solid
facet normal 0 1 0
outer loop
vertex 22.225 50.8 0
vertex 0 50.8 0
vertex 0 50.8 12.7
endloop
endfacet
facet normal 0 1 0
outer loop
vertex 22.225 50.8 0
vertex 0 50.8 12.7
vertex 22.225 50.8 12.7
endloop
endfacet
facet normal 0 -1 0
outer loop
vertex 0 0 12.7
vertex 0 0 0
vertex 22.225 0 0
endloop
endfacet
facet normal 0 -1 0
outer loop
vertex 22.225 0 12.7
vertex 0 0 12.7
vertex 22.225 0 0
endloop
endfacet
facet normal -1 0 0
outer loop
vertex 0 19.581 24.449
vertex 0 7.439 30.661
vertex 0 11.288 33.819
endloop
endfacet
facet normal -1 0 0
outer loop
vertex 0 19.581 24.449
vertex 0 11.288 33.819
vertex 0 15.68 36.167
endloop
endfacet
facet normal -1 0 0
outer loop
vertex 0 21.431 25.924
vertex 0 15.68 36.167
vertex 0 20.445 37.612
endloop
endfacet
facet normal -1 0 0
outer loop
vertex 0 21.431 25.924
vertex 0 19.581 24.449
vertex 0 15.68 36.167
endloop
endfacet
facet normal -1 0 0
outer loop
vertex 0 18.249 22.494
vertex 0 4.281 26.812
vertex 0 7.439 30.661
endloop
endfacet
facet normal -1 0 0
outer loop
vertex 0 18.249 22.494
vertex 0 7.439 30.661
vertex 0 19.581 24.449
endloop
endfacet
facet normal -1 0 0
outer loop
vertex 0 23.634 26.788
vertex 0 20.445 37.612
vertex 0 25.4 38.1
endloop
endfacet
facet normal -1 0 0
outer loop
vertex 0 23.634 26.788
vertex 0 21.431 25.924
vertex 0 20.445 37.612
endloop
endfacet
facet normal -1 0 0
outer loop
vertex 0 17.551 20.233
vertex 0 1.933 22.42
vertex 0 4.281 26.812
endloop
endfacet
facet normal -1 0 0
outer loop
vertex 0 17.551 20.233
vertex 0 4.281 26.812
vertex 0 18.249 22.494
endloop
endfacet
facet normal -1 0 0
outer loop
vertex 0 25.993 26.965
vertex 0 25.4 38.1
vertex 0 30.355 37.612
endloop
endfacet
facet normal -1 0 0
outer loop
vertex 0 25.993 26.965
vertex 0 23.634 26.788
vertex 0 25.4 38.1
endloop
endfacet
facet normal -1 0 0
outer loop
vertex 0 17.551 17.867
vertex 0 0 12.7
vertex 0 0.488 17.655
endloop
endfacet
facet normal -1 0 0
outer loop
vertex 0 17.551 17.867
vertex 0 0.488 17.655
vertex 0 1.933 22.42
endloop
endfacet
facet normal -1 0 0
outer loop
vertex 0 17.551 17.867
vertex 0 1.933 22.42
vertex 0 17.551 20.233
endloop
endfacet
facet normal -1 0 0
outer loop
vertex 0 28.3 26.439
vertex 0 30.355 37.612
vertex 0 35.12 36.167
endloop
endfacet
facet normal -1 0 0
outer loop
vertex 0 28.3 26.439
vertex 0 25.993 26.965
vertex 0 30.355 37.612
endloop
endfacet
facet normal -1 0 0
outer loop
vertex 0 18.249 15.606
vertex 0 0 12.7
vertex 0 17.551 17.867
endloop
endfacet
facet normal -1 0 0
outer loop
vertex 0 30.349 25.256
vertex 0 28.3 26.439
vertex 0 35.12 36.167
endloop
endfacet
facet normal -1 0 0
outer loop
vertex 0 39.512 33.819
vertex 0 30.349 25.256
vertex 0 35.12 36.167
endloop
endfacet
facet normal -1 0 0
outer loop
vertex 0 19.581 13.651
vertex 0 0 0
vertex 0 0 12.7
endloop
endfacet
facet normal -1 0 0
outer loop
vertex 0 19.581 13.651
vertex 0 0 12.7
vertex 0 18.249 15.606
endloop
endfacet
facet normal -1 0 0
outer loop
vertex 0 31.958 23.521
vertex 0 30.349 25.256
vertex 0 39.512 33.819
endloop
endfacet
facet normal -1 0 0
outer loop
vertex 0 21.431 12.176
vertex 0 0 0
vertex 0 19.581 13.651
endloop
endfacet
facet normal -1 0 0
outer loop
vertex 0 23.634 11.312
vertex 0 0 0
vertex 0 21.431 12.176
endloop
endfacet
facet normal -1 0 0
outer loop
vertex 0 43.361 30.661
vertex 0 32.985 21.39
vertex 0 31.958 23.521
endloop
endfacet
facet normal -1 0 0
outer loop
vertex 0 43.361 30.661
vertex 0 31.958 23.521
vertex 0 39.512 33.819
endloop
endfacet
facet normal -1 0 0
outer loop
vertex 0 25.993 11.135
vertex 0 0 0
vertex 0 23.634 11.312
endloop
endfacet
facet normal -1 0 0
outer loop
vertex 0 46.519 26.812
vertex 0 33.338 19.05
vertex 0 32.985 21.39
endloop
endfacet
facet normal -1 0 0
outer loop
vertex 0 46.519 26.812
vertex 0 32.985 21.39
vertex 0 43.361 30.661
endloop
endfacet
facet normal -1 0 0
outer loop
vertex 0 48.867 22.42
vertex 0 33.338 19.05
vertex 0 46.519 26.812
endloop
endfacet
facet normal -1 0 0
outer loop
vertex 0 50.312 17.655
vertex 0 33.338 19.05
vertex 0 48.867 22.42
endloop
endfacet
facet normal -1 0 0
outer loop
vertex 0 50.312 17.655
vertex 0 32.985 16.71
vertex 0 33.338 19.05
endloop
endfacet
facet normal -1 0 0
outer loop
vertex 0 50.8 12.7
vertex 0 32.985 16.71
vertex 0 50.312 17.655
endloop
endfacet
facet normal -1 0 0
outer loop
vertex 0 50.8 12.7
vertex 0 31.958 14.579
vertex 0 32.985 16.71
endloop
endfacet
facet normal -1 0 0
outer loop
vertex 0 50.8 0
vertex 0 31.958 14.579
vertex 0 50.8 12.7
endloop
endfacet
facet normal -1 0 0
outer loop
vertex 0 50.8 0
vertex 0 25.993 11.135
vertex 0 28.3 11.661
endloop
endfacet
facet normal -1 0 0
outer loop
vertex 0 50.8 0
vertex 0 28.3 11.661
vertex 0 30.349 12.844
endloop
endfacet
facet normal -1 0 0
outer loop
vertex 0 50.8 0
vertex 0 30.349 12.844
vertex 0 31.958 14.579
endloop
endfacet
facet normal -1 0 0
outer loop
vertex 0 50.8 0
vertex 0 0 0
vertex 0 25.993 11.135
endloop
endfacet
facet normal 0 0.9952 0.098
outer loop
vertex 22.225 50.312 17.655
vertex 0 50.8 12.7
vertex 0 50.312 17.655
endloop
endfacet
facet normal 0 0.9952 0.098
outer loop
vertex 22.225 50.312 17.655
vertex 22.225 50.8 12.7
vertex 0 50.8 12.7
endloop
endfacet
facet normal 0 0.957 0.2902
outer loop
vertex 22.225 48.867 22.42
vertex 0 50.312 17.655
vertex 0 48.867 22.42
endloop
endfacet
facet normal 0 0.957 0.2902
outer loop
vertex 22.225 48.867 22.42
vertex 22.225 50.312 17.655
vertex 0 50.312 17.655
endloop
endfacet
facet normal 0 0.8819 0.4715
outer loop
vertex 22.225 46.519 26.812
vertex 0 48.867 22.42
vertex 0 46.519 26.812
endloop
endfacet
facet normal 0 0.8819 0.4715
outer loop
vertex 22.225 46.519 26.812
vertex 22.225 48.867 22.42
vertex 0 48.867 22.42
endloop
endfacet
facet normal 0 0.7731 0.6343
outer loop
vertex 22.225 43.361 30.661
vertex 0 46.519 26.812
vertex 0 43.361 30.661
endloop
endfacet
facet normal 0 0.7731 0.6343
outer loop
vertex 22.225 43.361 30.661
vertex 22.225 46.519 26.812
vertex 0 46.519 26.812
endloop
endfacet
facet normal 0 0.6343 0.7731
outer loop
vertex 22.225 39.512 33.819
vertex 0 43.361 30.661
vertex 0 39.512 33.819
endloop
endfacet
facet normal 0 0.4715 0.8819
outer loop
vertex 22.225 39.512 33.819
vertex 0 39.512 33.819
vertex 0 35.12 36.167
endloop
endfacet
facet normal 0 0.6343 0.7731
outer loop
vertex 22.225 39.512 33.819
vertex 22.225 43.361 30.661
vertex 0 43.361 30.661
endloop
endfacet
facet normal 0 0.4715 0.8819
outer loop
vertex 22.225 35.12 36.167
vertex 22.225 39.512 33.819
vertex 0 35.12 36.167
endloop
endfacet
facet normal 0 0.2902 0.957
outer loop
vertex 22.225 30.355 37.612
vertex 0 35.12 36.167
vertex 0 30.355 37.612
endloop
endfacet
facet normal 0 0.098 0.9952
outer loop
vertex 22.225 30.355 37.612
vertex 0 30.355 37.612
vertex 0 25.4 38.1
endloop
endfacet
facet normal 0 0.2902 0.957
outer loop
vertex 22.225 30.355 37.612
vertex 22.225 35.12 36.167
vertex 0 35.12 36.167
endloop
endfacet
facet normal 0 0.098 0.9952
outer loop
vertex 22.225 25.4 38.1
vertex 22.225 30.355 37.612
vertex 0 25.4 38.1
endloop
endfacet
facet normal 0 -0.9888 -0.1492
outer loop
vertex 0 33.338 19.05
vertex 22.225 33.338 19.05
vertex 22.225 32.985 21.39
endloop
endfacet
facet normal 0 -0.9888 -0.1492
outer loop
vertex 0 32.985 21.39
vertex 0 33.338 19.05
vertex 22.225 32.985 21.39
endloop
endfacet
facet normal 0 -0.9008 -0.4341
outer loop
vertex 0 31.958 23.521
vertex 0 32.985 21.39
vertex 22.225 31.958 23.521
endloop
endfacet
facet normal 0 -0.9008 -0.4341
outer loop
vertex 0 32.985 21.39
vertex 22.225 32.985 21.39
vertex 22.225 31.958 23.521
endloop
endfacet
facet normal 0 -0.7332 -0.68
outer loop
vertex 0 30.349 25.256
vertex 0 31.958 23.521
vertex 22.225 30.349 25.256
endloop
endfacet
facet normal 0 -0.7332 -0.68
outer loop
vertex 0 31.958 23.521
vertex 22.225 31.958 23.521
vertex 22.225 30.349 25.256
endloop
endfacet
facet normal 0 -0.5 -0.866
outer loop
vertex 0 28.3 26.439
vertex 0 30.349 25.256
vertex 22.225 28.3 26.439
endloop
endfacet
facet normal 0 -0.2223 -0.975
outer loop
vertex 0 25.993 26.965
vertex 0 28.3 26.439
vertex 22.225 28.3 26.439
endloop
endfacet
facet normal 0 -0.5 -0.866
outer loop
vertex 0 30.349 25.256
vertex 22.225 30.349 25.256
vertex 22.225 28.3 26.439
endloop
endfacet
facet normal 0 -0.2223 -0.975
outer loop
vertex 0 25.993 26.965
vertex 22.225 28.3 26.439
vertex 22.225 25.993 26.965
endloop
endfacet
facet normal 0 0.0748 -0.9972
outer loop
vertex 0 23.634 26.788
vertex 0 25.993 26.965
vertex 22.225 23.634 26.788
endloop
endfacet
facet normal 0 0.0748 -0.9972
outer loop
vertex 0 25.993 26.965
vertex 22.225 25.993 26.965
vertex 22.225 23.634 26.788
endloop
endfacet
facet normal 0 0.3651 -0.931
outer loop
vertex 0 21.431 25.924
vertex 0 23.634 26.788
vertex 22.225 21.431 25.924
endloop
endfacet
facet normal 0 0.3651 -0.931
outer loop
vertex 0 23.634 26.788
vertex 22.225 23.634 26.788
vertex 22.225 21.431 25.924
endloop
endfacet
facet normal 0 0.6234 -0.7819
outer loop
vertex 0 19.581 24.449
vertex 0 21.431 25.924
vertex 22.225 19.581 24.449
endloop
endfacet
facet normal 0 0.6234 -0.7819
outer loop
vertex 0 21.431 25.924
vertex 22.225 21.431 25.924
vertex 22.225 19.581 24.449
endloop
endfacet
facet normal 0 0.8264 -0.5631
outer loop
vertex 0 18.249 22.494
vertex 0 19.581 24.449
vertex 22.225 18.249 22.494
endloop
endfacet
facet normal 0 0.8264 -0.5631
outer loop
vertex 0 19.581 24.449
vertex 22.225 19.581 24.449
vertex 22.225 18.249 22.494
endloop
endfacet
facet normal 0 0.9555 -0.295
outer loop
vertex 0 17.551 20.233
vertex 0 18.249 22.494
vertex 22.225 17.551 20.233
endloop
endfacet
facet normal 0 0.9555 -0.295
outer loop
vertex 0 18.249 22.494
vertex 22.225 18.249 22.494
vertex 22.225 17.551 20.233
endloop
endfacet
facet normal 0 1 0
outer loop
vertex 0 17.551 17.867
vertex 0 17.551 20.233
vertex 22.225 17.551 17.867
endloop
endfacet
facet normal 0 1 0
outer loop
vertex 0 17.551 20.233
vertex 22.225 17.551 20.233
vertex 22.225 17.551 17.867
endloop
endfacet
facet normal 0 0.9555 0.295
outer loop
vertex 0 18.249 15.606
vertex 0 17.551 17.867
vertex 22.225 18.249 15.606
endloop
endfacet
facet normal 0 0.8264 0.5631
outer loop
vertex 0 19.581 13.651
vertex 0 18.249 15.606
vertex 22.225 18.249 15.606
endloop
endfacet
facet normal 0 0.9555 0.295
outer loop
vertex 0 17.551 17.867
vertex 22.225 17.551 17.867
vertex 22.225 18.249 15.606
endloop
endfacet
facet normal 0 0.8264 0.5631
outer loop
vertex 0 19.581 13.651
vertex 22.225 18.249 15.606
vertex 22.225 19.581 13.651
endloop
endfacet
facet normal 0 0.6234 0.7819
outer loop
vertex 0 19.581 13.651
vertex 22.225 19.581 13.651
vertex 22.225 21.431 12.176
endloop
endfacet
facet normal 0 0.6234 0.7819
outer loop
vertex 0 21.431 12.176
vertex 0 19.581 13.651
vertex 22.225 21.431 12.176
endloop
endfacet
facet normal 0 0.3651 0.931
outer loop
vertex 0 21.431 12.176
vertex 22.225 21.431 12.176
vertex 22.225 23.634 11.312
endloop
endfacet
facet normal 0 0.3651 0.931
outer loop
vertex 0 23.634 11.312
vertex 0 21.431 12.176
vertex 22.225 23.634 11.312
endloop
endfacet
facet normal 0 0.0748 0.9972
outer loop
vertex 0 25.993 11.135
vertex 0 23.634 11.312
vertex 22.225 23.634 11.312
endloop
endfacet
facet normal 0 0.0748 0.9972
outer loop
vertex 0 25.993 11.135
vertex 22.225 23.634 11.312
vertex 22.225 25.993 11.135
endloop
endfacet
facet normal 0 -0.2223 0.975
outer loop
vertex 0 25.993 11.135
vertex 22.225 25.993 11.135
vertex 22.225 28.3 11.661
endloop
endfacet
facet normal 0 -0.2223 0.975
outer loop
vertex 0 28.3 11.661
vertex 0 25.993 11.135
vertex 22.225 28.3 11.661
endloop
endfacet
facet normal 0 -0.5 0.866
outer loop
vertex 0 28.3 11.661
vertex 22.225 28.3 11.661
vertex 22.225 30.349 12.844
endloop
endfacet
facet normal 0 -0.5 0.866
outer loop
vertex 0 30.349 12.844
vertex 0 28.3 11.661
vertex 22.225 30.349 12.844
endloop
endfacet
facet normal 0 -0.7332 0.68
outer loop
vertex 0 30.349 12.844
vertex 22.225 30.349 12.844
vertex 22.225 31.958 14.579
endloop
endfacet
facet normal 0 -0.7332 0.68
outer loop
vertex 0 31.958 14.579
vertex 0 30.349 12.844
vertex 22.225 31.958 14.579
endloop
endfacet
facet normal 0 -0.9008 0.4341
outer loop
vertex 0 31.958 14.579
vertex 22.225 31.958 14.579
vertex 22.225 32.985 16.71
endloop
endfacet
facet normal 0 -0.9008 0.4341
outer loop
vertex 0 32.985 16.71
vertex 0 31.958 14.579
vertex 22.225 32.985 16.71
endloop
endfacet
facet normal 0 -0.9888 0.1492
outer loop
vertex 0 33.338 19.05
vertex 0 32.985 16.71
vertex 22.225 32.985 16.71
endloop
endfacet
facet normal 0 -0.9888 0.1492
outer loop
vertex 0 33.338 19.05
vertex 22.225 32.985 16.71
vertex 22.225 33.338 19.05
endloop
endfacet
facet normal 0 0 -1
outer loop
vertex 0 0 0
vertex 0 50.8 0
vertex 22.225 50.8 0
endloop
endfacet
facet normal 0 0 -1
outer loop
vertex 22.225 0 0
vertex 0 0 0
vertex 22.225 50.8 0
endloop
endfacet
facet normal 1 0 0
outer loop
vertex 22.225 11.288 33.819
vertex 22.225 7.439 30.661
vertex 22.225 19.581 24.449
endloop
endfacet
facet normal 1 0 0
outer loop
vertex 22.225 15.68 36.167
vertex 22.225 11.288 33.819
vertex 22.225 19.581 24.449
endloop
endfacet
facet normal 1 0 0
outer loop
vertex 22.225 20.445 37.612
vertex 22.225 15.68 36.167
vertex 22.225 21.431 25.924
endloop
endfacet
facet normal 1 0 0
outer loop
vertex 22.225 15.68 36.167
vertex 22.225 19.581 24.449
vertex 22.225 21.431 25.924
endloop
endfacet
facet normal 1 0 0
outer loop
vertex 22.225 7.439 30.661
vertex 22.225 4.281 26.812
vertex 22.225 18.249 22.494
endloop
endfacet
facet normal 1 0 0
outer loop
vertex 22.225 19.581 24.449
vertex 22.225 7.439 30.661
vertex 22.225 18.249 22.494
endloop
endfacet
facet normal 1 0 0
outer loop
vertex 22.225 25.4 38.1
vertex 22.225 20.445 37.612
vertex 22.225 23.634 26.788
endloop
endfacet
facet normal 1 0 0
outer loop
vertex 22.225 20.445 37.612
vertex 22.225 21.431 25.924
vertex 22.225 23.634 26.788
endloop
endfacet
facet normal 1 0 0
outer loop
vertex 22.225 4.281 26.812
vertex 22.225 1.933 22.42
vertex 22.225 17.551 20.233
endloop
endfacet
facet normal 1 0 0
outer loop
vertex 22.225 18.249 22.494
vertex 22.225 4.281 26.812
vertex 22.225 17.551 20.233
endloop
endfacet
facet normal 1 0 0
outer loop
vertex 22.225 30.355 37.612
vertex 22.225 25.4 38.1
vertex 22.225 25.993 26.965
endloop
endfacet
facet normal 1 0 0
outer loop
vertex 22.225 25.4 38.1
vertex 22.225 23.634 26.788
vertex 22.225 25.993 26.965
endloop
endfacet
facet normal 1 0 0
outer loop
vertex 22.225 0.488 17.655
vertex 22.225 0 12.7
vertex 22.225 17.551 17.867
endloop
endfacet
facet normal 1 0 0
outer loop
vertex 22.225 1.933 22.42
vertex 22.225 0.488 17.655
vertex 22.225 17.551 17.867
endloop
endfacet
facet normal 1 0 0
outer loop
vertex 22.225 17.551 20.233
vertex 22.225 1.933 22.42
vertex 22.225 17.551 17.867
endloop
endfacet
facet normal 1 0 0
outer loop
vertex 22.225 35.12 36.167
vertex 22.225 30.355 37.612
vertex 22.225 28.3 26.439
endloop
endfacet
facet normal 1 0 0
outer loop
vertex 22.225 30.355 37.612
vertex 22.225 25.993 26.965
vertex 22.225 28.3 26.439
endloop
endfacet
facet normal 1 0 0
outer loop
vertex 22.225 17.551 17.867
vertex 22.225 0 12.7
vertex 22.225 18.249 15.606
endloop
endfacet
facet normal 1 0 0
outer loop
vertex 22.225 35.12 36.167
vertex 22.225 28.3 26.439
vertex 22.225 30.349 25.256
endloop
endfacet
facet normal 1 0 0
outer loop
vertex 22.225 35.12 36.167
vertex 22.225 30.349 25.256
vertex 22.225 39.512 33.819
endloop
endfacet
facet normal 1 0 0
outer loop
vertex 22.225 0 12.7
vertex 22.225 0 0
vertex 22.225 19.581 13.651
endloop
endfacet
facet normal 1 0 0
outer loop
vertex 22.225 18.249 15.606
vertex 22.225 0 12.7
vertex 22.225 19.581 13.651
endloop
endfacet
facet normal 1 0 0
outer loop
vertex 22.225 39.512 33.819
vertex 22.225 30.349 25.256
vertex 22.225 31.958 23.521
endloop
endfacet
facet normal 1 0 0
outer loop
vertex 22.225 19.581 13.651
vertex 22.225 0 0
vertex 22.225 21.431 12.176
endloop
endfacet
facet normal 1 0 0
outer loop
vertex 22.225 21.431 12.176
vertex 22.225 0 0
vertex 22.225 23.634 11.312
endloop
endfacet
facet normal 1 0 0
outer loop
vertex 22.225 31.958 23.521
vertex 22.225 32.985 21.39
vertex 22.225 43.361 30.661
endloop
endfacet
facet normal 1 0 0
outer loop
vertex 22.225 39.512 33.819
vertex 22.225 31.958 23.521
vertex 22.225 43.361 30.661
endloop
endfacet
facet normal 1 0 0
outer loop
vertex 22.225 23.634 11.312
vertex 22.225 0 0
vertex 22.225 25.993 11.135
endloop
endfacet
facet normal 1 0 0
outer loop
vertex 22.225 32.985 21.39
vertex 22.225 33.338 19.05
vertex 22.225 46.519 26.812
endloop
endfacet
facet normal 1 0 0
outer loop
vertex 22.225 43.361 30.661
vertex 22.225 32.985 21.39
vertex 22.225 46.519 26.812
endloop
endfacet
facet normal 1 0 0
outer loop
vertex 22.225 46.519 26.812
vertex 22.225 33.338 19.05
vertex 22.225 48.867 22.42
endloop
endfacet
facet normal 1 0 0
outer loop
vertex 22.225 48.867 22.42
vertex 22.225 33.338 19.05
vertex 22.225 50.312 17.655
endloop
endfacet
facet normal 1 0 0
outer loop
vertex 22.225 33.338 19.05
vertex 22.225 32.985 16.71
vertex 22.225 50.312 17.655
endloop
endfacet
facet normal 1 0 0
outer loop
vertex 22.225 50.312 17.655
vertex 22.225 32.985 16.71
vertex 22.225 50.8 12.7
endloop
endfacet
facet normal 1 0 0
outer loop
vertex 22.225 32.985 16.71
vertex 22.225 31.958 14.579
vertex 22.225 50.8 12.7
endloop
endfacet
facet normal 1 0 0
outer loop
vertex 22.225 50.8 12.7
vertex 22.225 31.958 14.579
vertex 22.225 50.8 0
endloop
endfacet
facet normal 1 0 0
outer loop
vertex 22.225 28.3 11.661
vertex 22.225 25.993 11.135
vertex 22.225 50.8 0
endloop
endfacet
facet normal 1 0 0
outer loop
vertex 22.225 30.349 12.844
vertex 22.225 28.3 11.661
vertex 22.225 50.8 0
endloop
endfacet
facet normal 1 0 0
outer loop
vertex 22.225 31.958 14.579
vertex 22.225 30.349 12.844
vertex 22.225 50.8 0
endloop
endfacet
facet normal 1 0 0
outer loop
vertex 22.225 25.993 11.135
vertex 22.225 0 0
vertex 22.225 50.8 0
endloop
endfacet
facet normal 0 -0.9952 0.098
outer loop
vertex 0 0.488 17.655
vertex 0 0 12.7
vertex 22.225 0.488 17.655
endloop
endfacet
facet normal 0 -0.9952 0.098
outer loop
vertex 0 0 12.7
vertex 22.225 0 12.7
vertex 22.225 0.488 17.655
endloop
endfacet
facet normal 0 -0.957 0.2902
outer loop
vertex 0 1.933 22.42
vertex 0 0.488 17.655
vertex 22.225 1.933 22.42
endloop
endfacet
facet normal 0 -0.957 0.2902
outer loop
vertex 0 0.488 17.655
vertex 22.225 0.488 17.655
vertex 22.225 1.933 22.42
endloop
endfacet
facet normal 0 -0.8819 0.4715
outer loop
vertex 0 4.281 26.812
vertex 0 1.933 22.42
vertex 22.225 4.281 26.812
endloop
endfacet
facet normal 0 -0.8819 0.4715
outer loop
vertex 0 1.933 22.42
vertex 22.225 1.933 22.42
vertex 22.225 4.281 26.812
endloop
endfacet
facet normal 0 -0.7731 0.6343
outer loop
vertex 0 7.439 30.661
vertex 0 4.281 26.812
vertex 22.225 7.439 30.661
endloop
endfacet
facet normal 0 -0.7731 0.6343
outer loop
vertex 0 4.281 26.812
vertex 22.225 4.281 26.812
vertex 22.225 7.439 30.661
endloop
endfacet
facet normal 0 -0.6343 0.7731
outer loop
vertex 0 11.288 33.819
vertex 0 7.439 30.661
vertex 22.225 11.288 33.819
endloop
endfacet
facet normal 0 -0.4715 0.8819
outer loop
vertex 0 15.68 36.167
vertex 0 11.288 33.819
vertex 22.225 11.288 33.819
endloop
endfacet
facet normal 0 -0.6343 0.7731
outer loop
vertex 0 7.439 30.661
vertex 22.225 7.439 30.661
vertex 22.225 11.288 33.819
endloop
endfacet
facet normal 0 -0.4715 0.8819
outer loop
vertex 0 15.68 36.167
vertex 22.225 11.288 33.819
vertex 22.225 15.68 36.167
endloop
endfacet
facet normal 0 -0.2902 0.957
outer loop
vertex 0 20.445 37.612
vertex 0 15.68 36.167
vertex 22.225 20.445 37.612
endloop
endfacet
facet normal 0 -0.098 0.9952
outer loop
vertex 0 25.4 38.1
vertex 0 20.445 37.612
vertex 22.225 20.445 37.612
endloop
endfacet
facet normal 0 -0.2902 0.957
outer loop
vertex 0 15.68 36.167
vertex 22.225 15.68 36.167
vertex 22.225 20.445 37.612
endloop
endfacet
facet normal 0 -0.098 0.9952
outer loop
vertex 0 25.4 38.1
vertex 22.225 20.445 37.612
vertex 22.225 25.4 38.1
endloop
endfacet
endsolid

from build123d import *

# Parameters (mm, degrees)
SKETCH1_W           = 22.225
SKETCH1_H           = 50.8
BOSS_EXTRUDE1_DEPTH = 38.1
FILLET1_R           = 25.4
SKETCH2_R           = 7.9375
CUT_EXTRUDE1_DEPTH  = 38.1


with BuildPart() as part:
    # Sketch1 → Boss-Extrude1 (new body)
    with BuildSketch(Plane.XY):
        with Locations((11.1125, 25.4)):
            Rectangle(SKETCH1_W, SKETCH1_H)
    extrude(amount=BOSS_EXTRUDE1_DEPTH)

    # Fillet1
    fillet1_edges = [part.edges().sort_by_distance(p)[0] for p in [
        (11.1125, 0, 38.1),
        (11.1125, 50.8, 38.1),
    ]]
    fillet(fillet1_edges, radius=FILLET1_R - 0.0001)  # a hair under: the kernel refuses the full size

    # Sketch2 → Cut-Extrude1 (cut)
    with BuildSketch(Plane(origin=(22.225, 0, 0), x_dir=(0, 0, -1), z_dir=(1, 0, 0))):
        with Locations(Location((-19.05, 25.4, 0), (0, 0, 90))):
            Circle(SKETCH2_R)
    extrude(amount=-CUT_EXTRUDE1_DEPTH, mode=Mode.SUBTRACT)


solid = part.part
